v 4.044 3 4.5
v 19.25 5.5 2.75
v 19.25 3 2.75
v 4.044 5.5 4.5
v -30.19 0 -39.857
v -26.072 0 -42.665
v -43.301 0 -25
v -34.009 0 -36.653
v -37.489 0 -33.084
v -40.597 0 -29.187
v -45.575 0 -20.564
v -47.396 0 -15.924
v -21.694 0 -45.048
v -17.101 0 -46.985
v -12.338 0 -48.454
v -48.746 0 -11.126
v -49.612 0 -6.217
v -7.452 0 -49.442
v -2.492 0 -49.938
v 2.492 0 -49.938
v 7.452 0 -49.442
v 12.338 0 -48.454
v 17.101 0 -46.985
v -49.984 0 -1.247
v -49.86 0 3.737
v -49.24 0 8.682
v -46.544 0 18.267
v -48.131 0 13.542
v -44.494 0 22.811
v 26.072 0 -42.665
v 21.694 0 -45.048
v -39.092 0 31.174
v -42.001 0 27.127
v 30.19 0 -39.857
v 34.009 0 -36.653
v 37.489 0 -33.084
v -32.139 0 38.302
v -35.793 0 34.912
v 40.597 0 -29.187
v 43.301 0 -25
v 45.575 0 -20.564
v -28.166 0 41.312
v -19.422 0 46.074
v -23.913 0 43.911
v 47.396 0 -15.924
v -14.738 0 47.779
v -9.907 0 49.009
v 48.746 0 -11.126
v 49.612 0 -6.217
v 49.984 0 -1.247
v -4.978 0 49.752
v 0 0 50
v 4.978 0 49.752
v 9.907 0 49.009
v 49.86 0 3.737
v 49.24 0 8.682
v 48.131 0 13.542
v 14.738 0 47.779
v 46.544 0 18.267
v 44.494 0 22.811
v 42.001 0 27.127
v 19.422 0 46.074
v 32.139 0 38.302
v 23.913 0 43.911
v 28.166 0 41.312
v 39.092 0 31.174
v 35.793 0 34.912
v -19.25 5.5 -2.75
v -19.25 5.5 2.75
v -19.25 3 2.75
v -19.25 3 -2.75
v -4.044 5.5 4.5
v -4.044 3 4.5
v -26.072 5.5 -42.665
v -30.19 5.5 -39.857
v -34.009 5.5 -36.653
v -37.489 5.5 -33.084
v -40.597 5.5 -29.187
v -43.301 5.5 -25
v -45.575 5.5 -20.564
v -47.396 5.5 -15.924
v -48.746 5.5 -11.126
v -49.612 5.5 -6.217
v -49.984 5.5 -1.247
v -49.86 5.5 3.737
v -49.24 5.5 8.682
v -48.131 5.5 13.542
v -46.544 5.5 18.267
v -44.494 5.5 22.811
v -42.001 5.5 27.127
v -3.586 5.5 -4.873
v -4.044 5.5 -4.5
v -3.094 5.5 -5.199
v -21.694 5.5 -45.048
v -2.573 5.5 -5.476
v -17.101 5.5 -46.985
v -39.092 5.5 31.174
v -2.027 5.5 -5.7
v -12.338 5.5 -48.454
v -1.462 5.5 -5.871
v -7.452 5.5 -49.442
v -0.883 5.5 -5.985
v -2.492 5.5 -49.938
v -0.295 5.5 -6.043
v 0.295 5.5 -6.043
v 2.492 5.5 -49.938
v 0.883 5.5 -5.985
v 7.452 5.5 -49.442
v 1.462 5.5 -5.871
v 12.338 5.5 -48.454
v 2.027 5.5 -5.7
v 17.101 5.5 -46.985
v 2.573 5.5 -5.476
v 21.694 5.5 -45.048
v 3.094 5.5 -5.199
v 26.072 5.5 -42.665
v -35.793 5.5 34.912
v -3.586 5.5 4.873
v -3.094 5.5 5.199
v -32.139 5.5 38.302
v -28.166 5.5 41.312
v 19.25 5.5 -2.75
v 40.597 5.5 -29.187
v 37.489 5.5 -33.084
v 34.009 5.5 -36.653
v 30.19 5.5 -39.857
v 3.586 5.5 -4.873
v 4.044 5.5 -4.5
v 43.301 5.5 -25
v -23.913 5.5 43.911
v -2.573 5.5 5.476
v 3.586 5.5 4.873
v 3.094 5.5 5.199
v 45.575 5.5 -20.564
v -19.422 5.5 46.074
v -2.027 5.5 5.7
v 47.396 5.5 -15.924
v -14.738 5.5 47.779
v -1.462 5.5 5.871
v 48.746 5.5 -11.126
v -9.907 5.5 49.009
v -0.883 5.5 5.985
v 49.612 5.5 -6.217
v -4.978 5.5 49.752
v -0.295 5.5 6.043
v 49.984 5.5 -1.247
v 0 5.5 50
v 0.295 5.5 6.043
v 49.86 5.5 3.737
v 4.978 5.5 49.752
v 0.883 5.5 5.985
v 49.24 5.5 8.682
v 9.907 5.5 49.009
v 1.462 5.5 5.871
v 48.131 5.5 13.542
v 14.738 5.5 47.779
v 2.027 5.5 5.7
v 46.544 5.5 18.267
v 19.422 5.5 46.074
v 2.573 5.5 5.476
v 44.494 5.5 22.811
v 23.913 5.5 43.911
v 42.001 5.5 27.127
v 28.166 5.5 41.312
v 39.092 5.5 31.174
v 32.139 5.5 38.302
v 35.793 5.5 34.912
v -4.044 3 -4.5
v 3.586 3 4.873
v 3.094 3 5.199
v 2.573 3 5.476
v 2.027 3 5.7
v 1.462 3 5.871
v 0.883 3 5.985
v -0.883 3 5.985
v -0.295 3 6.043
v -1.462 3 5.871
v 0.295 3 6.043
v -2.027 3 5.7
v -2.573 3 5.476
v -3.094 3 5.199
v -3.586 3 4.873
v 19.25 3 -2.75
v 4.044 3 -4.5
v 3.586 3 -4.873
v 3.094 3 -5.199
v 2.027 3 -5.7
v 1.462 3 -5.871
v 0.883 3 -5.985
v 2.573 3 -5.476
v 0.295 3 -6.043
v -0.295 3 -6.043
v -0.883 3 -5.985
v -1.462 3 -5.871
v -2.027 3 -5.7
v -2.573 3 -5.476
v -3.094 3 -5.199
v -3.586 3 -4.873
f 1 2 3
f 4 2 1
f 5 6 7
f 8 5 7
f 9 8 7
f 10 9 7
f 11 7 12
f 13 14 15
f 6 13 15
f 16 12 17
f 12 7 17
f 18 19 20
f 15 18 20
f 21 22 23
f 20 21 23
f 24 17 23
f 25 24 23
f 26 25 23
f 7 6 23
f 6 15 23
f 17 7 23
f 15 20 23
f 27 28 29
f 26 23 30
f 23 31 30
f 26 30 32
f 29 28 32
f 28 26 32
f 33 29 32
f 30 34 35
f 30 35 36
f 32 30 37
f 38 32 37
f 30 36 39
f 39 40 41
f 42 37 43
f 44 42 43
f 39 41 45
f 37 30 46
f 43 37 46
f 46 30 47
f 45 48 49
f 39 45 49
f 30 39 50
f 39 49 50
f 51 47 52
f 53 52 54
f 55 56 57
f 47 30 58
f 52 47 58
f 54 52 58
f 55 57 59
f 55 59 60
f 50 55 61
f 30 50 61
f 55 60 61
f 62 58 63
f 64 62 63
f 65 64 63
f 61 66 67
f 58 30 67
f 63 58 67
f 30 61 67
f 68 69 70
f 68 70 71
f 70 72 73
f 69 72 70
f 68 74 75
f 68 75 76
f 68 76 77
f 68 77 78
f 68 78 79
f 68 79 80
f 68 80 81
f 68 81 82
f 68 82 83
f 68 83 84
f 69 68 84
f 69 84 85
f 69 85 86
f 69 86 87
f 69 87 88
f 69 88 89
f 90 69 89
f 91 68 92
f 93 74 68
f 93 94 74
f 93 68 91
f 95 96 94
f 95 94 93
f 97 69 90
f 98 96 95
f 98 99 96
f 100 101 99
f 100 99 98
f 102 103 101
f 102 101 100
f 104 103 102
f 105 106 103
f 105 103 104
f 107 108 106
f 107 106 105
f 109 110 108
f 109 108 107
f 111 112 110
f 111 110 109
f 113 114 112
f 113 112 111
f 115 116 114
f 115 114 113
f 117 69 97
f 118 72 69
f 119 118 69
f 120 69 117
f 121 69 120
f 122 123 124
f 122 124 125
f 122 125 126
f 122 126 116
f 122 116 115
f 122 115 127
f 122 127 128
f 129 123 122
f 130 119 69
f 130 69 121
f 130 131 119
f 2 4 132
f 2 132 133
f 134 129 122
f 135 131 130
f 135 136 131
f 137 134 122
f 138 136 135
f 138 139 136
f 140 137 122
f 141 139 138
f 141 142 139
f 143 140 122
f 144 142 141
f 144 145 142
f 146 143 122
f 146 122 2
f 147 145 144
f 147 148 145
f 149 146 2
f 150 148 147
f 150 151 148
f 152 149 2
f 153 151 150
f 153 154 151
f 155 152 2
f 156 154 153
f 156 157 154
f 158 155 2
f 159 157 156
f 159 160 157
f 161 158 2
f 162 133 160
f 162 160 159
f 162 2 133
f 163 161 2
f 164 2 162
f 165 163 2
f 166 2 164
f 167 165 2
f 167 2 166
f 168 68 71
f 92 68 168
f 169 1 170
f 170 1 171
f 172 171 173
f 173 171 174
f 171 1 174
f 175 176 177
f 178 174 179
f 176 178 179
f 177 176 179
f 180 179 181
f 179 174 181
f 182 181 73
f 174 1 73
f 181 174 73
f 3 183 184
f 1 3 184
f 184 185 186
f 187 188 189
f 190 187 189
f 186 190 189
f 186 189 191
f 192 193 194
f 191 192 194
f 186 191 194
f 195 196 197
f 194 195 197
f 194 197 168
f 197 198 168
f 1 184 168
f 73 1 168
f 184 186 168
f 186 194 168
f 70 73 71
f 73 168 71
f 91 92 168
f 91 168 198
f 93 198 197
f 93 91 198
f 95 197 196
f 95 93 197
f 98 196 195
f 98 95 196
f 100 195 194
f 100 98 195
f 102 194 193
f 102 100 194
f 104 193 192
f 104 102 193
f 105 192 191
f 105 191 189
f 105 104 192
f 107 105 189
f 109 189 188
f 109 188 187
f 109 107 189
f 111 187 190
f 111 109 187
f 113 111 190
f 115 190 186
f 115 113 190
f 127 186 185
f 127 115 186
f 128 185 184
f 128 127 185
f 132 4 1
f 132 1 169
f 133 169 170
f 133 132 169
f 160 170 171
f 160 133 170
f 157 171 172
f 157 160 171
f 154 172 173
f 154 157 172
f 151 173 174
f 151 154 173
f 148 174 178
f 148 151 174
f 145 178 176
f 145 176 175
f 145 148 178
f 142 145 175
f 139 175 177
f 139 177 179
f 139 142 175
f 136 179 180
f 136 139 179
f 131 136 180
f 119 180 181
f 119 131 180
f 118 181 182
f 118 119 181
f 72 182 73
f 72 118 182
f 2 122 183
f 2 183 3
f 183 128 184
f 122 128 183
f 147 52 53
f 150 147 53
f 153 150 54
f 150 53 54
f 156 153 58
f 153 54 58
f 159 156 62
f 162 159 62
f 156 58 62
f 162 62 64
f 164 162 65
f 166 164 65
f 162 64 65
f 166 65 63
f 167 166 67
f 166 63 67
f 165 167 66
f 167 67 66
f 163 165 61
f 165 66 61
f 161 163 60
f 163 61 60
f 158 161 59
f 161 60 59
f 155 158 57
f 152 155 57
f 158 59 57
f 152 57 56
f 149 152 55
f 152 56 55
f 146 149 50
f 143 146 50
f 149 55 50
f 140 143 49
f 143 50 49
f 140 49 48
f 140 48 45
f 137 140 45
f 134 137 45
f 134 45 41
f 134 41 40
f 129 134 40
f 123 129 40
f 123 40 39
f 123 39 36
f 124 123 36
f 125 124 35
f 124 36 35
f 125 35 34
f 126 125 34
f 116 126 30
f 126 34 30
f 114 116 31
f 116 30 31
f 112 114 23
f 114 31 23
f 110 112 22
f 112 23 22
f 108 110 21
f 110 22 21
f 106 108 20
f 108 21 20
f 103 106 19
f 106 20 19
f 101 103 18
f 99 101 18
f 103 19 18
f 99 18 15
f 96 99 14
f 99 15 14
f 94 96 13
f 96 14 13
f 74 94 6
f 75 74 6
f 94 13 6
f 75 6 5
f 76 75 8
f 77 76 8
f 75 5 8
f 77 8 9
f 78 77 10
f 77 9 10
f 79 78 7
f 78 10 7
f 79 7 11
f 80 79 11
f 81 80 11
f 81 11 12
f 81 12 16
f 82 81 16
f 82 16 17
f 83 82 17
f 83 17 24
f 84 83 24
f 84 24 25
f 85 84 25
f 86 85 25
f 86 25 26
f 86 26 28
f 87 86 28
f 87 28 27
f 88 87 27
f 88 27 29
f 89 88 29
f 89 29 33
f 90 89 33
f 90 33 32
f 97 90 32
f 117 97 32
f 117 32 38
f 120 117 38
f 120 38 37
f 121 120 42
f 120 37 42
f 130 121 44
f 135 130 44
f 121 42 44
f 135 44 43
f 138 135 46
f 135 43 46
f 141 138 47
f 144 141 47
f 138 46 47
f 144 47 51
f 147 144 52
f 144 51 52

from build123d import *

# Parameters (mm, degrees)
SKETCH1_R           = 50
BOSS_EXTRUDE1_DEPTH = 5.5
CUT_EXTRUDE1_DEPTH  = 2.5


with BuildPart() as part:
    # Sketch1 → Boss-Extrude1 (new body)
    with BuildSketch(Plane(origin=(0, 0, 0), x_dir=(1, 0, 0), z_dir=(0, 1, 0))):
        with Locations(Location((0, 0, 0), (0, 0, 270))):
            Circle(SKETCH1_R)
    extrude(amount=BOSS_EXTRUDE1_DEPTH)

    # Sketch2 → Cut-Extrude1 (cut)
    with BuildSketch(Plane(origin=(0, 5.5, 0), x_dir=(1, 0, 0), z_dir=(0, 1, 0))):
        with BuildLine():
            Line((-4.043822449, -4.5), (-19.25, -2.75))
            Line((-19.25, -2.75), (-19.25, 2.75))
            Line((-19.25, 2.75), (-4.043822449, 4.5))
            ThreePointArc((-4.043822449, 4.5), (0, 6.05), (4.043822449, 4.5))
            Line((4.043822449, 4.5), (19.25, 2.75))
            Line((19.25, 2.75), (19.25, -2.75))
            Line((19.25, -2.75), (4.043822449, -4.5))
            ThreePointArc((4.043822449, -4.5), (0, -6.05), (-4.043822449, -4.5))
        make_face()
    extrude(amount=-CUT_EXTRUDE1_DEPTH, mode=Mode.SUBTRACT)


solid = part.part
